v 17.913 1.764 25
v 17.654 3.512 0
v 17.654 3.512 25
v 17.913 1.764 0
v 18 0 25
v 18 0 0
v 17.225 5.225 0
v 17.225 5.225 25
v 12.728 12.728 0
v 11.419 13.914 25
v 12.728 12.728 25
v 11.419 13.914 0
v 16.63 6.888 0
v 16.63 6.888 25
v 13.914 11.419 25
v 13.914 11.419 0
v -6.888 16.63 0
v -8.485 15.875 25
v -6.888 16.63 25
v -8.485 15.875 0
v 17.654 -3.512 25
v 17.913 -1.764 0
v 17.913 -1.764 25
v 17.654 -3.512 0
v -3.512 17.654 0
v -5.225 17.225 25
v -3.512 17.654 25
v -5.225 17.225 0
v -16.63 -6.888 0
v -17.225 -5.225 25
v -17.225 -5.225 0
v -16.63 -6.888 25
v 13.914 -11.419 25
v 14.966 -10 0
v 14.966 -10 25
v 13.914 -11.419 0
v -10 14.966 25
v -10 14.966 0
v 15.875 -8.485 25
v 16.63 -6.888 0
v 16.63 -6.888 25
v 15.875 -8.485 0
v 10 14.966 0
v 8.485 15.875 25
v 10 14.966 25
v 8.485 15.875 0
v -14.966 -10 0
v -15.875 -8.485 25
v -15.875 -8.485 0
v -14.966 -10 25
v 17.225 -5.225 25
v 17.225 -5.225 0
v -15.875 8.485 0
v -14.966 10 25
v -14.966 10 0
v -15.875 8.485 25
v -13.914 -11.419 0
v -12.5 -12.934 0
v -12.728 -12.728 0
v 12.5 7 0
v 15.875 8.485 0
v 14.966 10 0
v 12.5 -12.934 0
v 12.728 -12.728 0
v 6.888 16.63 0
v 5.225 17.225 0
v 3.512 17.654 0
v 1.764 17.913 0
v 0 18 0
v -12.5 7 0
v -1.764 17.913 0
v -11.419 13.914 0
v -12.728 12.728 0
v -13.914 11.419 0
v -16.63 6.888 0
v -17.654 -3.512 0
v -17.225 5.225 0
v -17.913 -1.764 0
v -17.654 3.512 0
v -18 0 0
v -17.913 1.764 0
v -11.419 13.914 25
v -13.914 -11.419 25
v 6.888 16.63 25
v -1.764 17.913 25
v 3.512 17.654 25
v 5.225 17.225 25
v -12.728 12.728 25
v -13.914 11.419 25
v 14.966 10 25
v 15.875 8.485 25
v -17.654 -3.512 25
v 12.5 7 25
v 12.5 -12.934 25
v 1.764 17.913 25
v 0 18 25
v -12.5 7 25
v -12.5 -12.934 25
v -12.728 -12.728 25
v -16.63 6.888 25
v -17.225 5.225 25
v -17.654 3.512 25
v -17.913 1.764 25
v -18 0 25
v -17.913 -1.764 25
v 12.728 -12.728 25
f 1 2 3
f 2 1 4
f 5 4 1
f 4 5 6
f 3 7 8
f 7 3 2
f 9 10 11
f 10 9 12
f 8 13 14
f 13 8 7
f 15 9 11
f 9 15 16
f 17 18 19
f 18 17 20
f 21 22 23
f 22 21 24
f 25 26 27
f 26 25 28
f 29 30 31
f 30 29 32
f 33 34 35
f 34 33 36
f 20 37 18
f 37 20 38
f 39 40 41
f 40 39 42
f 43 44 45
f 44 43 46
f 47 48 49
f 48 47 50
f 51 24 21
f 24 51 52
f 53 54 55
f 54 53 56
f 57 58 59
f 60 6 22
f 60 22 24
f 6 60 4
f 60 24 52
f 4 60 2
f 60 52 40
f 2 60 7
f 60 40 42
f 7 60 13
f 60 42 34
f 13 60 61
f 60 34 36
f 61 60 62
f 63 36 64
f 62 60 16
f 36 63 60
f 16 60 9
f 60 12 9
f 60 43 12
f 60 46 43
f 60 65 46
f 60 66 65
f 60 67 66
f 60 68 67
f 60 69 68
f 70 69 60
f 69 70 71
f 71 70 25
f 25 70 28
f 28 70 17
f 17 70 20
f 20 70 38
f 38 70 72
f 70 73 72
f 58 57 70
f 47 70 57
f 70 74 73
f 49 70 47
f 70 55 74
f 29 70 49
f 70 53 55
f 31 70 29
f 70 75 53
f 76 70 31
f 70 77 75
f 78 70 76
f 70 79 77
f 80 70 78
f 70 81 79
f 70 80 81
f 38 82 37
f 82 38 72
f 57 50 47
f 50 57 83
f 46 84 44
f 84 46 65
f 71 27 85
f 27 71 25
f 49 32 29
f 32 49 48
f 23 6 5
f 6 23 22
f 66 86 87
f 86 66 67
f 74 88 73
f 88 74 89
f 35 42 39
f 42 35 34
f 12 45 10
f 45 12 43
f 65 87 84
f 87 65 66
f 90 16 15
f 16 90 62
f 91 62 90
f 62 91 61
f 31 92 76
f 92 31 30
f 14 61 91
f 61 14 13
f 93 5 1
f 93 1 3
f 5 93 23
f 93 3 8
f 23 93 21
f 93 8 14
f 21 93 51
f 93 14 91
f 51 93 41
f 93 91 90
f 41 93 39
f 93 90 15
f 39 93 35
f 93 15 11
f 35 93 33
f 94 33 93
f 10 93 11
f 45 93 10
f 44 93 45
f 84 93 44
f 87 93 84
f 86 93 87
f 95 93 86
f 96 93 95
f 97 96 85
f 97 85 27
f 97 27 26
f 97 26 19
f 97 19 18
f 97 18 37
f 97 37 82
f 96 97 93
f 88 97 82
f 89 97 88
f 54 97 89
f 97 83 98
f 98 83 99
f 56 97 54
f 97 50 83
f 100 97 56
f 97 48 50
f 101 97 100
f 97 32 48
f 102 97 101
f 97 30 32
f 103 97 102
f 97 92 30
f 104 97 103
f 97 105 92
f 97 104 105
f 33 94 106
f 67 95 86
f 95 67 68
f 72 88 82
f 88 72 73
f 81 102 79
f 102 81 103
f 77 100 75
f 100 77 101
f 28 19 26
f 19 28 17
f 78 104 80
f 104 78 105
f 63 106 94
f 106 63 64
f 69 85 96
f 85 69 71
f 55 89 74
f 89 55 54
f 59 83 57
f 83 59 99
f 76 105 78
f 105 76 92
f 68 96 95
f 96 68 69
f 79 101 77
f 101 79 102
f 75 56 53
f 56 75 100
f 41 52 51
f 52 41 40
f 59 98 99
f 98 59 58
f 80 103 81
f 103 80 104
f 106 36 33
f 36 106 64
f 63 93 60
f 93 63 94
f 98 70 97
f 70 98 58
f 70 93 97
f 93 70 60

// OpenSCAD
$fn=64;

l = 25;
r = 18;
eps = 0.01;


difference() {
    cylinder( r=r, h=l );
    
    translate( [ -l/2, -r, -eps ] )
    cube( [ l, l, l + 2*eps ] );
}
